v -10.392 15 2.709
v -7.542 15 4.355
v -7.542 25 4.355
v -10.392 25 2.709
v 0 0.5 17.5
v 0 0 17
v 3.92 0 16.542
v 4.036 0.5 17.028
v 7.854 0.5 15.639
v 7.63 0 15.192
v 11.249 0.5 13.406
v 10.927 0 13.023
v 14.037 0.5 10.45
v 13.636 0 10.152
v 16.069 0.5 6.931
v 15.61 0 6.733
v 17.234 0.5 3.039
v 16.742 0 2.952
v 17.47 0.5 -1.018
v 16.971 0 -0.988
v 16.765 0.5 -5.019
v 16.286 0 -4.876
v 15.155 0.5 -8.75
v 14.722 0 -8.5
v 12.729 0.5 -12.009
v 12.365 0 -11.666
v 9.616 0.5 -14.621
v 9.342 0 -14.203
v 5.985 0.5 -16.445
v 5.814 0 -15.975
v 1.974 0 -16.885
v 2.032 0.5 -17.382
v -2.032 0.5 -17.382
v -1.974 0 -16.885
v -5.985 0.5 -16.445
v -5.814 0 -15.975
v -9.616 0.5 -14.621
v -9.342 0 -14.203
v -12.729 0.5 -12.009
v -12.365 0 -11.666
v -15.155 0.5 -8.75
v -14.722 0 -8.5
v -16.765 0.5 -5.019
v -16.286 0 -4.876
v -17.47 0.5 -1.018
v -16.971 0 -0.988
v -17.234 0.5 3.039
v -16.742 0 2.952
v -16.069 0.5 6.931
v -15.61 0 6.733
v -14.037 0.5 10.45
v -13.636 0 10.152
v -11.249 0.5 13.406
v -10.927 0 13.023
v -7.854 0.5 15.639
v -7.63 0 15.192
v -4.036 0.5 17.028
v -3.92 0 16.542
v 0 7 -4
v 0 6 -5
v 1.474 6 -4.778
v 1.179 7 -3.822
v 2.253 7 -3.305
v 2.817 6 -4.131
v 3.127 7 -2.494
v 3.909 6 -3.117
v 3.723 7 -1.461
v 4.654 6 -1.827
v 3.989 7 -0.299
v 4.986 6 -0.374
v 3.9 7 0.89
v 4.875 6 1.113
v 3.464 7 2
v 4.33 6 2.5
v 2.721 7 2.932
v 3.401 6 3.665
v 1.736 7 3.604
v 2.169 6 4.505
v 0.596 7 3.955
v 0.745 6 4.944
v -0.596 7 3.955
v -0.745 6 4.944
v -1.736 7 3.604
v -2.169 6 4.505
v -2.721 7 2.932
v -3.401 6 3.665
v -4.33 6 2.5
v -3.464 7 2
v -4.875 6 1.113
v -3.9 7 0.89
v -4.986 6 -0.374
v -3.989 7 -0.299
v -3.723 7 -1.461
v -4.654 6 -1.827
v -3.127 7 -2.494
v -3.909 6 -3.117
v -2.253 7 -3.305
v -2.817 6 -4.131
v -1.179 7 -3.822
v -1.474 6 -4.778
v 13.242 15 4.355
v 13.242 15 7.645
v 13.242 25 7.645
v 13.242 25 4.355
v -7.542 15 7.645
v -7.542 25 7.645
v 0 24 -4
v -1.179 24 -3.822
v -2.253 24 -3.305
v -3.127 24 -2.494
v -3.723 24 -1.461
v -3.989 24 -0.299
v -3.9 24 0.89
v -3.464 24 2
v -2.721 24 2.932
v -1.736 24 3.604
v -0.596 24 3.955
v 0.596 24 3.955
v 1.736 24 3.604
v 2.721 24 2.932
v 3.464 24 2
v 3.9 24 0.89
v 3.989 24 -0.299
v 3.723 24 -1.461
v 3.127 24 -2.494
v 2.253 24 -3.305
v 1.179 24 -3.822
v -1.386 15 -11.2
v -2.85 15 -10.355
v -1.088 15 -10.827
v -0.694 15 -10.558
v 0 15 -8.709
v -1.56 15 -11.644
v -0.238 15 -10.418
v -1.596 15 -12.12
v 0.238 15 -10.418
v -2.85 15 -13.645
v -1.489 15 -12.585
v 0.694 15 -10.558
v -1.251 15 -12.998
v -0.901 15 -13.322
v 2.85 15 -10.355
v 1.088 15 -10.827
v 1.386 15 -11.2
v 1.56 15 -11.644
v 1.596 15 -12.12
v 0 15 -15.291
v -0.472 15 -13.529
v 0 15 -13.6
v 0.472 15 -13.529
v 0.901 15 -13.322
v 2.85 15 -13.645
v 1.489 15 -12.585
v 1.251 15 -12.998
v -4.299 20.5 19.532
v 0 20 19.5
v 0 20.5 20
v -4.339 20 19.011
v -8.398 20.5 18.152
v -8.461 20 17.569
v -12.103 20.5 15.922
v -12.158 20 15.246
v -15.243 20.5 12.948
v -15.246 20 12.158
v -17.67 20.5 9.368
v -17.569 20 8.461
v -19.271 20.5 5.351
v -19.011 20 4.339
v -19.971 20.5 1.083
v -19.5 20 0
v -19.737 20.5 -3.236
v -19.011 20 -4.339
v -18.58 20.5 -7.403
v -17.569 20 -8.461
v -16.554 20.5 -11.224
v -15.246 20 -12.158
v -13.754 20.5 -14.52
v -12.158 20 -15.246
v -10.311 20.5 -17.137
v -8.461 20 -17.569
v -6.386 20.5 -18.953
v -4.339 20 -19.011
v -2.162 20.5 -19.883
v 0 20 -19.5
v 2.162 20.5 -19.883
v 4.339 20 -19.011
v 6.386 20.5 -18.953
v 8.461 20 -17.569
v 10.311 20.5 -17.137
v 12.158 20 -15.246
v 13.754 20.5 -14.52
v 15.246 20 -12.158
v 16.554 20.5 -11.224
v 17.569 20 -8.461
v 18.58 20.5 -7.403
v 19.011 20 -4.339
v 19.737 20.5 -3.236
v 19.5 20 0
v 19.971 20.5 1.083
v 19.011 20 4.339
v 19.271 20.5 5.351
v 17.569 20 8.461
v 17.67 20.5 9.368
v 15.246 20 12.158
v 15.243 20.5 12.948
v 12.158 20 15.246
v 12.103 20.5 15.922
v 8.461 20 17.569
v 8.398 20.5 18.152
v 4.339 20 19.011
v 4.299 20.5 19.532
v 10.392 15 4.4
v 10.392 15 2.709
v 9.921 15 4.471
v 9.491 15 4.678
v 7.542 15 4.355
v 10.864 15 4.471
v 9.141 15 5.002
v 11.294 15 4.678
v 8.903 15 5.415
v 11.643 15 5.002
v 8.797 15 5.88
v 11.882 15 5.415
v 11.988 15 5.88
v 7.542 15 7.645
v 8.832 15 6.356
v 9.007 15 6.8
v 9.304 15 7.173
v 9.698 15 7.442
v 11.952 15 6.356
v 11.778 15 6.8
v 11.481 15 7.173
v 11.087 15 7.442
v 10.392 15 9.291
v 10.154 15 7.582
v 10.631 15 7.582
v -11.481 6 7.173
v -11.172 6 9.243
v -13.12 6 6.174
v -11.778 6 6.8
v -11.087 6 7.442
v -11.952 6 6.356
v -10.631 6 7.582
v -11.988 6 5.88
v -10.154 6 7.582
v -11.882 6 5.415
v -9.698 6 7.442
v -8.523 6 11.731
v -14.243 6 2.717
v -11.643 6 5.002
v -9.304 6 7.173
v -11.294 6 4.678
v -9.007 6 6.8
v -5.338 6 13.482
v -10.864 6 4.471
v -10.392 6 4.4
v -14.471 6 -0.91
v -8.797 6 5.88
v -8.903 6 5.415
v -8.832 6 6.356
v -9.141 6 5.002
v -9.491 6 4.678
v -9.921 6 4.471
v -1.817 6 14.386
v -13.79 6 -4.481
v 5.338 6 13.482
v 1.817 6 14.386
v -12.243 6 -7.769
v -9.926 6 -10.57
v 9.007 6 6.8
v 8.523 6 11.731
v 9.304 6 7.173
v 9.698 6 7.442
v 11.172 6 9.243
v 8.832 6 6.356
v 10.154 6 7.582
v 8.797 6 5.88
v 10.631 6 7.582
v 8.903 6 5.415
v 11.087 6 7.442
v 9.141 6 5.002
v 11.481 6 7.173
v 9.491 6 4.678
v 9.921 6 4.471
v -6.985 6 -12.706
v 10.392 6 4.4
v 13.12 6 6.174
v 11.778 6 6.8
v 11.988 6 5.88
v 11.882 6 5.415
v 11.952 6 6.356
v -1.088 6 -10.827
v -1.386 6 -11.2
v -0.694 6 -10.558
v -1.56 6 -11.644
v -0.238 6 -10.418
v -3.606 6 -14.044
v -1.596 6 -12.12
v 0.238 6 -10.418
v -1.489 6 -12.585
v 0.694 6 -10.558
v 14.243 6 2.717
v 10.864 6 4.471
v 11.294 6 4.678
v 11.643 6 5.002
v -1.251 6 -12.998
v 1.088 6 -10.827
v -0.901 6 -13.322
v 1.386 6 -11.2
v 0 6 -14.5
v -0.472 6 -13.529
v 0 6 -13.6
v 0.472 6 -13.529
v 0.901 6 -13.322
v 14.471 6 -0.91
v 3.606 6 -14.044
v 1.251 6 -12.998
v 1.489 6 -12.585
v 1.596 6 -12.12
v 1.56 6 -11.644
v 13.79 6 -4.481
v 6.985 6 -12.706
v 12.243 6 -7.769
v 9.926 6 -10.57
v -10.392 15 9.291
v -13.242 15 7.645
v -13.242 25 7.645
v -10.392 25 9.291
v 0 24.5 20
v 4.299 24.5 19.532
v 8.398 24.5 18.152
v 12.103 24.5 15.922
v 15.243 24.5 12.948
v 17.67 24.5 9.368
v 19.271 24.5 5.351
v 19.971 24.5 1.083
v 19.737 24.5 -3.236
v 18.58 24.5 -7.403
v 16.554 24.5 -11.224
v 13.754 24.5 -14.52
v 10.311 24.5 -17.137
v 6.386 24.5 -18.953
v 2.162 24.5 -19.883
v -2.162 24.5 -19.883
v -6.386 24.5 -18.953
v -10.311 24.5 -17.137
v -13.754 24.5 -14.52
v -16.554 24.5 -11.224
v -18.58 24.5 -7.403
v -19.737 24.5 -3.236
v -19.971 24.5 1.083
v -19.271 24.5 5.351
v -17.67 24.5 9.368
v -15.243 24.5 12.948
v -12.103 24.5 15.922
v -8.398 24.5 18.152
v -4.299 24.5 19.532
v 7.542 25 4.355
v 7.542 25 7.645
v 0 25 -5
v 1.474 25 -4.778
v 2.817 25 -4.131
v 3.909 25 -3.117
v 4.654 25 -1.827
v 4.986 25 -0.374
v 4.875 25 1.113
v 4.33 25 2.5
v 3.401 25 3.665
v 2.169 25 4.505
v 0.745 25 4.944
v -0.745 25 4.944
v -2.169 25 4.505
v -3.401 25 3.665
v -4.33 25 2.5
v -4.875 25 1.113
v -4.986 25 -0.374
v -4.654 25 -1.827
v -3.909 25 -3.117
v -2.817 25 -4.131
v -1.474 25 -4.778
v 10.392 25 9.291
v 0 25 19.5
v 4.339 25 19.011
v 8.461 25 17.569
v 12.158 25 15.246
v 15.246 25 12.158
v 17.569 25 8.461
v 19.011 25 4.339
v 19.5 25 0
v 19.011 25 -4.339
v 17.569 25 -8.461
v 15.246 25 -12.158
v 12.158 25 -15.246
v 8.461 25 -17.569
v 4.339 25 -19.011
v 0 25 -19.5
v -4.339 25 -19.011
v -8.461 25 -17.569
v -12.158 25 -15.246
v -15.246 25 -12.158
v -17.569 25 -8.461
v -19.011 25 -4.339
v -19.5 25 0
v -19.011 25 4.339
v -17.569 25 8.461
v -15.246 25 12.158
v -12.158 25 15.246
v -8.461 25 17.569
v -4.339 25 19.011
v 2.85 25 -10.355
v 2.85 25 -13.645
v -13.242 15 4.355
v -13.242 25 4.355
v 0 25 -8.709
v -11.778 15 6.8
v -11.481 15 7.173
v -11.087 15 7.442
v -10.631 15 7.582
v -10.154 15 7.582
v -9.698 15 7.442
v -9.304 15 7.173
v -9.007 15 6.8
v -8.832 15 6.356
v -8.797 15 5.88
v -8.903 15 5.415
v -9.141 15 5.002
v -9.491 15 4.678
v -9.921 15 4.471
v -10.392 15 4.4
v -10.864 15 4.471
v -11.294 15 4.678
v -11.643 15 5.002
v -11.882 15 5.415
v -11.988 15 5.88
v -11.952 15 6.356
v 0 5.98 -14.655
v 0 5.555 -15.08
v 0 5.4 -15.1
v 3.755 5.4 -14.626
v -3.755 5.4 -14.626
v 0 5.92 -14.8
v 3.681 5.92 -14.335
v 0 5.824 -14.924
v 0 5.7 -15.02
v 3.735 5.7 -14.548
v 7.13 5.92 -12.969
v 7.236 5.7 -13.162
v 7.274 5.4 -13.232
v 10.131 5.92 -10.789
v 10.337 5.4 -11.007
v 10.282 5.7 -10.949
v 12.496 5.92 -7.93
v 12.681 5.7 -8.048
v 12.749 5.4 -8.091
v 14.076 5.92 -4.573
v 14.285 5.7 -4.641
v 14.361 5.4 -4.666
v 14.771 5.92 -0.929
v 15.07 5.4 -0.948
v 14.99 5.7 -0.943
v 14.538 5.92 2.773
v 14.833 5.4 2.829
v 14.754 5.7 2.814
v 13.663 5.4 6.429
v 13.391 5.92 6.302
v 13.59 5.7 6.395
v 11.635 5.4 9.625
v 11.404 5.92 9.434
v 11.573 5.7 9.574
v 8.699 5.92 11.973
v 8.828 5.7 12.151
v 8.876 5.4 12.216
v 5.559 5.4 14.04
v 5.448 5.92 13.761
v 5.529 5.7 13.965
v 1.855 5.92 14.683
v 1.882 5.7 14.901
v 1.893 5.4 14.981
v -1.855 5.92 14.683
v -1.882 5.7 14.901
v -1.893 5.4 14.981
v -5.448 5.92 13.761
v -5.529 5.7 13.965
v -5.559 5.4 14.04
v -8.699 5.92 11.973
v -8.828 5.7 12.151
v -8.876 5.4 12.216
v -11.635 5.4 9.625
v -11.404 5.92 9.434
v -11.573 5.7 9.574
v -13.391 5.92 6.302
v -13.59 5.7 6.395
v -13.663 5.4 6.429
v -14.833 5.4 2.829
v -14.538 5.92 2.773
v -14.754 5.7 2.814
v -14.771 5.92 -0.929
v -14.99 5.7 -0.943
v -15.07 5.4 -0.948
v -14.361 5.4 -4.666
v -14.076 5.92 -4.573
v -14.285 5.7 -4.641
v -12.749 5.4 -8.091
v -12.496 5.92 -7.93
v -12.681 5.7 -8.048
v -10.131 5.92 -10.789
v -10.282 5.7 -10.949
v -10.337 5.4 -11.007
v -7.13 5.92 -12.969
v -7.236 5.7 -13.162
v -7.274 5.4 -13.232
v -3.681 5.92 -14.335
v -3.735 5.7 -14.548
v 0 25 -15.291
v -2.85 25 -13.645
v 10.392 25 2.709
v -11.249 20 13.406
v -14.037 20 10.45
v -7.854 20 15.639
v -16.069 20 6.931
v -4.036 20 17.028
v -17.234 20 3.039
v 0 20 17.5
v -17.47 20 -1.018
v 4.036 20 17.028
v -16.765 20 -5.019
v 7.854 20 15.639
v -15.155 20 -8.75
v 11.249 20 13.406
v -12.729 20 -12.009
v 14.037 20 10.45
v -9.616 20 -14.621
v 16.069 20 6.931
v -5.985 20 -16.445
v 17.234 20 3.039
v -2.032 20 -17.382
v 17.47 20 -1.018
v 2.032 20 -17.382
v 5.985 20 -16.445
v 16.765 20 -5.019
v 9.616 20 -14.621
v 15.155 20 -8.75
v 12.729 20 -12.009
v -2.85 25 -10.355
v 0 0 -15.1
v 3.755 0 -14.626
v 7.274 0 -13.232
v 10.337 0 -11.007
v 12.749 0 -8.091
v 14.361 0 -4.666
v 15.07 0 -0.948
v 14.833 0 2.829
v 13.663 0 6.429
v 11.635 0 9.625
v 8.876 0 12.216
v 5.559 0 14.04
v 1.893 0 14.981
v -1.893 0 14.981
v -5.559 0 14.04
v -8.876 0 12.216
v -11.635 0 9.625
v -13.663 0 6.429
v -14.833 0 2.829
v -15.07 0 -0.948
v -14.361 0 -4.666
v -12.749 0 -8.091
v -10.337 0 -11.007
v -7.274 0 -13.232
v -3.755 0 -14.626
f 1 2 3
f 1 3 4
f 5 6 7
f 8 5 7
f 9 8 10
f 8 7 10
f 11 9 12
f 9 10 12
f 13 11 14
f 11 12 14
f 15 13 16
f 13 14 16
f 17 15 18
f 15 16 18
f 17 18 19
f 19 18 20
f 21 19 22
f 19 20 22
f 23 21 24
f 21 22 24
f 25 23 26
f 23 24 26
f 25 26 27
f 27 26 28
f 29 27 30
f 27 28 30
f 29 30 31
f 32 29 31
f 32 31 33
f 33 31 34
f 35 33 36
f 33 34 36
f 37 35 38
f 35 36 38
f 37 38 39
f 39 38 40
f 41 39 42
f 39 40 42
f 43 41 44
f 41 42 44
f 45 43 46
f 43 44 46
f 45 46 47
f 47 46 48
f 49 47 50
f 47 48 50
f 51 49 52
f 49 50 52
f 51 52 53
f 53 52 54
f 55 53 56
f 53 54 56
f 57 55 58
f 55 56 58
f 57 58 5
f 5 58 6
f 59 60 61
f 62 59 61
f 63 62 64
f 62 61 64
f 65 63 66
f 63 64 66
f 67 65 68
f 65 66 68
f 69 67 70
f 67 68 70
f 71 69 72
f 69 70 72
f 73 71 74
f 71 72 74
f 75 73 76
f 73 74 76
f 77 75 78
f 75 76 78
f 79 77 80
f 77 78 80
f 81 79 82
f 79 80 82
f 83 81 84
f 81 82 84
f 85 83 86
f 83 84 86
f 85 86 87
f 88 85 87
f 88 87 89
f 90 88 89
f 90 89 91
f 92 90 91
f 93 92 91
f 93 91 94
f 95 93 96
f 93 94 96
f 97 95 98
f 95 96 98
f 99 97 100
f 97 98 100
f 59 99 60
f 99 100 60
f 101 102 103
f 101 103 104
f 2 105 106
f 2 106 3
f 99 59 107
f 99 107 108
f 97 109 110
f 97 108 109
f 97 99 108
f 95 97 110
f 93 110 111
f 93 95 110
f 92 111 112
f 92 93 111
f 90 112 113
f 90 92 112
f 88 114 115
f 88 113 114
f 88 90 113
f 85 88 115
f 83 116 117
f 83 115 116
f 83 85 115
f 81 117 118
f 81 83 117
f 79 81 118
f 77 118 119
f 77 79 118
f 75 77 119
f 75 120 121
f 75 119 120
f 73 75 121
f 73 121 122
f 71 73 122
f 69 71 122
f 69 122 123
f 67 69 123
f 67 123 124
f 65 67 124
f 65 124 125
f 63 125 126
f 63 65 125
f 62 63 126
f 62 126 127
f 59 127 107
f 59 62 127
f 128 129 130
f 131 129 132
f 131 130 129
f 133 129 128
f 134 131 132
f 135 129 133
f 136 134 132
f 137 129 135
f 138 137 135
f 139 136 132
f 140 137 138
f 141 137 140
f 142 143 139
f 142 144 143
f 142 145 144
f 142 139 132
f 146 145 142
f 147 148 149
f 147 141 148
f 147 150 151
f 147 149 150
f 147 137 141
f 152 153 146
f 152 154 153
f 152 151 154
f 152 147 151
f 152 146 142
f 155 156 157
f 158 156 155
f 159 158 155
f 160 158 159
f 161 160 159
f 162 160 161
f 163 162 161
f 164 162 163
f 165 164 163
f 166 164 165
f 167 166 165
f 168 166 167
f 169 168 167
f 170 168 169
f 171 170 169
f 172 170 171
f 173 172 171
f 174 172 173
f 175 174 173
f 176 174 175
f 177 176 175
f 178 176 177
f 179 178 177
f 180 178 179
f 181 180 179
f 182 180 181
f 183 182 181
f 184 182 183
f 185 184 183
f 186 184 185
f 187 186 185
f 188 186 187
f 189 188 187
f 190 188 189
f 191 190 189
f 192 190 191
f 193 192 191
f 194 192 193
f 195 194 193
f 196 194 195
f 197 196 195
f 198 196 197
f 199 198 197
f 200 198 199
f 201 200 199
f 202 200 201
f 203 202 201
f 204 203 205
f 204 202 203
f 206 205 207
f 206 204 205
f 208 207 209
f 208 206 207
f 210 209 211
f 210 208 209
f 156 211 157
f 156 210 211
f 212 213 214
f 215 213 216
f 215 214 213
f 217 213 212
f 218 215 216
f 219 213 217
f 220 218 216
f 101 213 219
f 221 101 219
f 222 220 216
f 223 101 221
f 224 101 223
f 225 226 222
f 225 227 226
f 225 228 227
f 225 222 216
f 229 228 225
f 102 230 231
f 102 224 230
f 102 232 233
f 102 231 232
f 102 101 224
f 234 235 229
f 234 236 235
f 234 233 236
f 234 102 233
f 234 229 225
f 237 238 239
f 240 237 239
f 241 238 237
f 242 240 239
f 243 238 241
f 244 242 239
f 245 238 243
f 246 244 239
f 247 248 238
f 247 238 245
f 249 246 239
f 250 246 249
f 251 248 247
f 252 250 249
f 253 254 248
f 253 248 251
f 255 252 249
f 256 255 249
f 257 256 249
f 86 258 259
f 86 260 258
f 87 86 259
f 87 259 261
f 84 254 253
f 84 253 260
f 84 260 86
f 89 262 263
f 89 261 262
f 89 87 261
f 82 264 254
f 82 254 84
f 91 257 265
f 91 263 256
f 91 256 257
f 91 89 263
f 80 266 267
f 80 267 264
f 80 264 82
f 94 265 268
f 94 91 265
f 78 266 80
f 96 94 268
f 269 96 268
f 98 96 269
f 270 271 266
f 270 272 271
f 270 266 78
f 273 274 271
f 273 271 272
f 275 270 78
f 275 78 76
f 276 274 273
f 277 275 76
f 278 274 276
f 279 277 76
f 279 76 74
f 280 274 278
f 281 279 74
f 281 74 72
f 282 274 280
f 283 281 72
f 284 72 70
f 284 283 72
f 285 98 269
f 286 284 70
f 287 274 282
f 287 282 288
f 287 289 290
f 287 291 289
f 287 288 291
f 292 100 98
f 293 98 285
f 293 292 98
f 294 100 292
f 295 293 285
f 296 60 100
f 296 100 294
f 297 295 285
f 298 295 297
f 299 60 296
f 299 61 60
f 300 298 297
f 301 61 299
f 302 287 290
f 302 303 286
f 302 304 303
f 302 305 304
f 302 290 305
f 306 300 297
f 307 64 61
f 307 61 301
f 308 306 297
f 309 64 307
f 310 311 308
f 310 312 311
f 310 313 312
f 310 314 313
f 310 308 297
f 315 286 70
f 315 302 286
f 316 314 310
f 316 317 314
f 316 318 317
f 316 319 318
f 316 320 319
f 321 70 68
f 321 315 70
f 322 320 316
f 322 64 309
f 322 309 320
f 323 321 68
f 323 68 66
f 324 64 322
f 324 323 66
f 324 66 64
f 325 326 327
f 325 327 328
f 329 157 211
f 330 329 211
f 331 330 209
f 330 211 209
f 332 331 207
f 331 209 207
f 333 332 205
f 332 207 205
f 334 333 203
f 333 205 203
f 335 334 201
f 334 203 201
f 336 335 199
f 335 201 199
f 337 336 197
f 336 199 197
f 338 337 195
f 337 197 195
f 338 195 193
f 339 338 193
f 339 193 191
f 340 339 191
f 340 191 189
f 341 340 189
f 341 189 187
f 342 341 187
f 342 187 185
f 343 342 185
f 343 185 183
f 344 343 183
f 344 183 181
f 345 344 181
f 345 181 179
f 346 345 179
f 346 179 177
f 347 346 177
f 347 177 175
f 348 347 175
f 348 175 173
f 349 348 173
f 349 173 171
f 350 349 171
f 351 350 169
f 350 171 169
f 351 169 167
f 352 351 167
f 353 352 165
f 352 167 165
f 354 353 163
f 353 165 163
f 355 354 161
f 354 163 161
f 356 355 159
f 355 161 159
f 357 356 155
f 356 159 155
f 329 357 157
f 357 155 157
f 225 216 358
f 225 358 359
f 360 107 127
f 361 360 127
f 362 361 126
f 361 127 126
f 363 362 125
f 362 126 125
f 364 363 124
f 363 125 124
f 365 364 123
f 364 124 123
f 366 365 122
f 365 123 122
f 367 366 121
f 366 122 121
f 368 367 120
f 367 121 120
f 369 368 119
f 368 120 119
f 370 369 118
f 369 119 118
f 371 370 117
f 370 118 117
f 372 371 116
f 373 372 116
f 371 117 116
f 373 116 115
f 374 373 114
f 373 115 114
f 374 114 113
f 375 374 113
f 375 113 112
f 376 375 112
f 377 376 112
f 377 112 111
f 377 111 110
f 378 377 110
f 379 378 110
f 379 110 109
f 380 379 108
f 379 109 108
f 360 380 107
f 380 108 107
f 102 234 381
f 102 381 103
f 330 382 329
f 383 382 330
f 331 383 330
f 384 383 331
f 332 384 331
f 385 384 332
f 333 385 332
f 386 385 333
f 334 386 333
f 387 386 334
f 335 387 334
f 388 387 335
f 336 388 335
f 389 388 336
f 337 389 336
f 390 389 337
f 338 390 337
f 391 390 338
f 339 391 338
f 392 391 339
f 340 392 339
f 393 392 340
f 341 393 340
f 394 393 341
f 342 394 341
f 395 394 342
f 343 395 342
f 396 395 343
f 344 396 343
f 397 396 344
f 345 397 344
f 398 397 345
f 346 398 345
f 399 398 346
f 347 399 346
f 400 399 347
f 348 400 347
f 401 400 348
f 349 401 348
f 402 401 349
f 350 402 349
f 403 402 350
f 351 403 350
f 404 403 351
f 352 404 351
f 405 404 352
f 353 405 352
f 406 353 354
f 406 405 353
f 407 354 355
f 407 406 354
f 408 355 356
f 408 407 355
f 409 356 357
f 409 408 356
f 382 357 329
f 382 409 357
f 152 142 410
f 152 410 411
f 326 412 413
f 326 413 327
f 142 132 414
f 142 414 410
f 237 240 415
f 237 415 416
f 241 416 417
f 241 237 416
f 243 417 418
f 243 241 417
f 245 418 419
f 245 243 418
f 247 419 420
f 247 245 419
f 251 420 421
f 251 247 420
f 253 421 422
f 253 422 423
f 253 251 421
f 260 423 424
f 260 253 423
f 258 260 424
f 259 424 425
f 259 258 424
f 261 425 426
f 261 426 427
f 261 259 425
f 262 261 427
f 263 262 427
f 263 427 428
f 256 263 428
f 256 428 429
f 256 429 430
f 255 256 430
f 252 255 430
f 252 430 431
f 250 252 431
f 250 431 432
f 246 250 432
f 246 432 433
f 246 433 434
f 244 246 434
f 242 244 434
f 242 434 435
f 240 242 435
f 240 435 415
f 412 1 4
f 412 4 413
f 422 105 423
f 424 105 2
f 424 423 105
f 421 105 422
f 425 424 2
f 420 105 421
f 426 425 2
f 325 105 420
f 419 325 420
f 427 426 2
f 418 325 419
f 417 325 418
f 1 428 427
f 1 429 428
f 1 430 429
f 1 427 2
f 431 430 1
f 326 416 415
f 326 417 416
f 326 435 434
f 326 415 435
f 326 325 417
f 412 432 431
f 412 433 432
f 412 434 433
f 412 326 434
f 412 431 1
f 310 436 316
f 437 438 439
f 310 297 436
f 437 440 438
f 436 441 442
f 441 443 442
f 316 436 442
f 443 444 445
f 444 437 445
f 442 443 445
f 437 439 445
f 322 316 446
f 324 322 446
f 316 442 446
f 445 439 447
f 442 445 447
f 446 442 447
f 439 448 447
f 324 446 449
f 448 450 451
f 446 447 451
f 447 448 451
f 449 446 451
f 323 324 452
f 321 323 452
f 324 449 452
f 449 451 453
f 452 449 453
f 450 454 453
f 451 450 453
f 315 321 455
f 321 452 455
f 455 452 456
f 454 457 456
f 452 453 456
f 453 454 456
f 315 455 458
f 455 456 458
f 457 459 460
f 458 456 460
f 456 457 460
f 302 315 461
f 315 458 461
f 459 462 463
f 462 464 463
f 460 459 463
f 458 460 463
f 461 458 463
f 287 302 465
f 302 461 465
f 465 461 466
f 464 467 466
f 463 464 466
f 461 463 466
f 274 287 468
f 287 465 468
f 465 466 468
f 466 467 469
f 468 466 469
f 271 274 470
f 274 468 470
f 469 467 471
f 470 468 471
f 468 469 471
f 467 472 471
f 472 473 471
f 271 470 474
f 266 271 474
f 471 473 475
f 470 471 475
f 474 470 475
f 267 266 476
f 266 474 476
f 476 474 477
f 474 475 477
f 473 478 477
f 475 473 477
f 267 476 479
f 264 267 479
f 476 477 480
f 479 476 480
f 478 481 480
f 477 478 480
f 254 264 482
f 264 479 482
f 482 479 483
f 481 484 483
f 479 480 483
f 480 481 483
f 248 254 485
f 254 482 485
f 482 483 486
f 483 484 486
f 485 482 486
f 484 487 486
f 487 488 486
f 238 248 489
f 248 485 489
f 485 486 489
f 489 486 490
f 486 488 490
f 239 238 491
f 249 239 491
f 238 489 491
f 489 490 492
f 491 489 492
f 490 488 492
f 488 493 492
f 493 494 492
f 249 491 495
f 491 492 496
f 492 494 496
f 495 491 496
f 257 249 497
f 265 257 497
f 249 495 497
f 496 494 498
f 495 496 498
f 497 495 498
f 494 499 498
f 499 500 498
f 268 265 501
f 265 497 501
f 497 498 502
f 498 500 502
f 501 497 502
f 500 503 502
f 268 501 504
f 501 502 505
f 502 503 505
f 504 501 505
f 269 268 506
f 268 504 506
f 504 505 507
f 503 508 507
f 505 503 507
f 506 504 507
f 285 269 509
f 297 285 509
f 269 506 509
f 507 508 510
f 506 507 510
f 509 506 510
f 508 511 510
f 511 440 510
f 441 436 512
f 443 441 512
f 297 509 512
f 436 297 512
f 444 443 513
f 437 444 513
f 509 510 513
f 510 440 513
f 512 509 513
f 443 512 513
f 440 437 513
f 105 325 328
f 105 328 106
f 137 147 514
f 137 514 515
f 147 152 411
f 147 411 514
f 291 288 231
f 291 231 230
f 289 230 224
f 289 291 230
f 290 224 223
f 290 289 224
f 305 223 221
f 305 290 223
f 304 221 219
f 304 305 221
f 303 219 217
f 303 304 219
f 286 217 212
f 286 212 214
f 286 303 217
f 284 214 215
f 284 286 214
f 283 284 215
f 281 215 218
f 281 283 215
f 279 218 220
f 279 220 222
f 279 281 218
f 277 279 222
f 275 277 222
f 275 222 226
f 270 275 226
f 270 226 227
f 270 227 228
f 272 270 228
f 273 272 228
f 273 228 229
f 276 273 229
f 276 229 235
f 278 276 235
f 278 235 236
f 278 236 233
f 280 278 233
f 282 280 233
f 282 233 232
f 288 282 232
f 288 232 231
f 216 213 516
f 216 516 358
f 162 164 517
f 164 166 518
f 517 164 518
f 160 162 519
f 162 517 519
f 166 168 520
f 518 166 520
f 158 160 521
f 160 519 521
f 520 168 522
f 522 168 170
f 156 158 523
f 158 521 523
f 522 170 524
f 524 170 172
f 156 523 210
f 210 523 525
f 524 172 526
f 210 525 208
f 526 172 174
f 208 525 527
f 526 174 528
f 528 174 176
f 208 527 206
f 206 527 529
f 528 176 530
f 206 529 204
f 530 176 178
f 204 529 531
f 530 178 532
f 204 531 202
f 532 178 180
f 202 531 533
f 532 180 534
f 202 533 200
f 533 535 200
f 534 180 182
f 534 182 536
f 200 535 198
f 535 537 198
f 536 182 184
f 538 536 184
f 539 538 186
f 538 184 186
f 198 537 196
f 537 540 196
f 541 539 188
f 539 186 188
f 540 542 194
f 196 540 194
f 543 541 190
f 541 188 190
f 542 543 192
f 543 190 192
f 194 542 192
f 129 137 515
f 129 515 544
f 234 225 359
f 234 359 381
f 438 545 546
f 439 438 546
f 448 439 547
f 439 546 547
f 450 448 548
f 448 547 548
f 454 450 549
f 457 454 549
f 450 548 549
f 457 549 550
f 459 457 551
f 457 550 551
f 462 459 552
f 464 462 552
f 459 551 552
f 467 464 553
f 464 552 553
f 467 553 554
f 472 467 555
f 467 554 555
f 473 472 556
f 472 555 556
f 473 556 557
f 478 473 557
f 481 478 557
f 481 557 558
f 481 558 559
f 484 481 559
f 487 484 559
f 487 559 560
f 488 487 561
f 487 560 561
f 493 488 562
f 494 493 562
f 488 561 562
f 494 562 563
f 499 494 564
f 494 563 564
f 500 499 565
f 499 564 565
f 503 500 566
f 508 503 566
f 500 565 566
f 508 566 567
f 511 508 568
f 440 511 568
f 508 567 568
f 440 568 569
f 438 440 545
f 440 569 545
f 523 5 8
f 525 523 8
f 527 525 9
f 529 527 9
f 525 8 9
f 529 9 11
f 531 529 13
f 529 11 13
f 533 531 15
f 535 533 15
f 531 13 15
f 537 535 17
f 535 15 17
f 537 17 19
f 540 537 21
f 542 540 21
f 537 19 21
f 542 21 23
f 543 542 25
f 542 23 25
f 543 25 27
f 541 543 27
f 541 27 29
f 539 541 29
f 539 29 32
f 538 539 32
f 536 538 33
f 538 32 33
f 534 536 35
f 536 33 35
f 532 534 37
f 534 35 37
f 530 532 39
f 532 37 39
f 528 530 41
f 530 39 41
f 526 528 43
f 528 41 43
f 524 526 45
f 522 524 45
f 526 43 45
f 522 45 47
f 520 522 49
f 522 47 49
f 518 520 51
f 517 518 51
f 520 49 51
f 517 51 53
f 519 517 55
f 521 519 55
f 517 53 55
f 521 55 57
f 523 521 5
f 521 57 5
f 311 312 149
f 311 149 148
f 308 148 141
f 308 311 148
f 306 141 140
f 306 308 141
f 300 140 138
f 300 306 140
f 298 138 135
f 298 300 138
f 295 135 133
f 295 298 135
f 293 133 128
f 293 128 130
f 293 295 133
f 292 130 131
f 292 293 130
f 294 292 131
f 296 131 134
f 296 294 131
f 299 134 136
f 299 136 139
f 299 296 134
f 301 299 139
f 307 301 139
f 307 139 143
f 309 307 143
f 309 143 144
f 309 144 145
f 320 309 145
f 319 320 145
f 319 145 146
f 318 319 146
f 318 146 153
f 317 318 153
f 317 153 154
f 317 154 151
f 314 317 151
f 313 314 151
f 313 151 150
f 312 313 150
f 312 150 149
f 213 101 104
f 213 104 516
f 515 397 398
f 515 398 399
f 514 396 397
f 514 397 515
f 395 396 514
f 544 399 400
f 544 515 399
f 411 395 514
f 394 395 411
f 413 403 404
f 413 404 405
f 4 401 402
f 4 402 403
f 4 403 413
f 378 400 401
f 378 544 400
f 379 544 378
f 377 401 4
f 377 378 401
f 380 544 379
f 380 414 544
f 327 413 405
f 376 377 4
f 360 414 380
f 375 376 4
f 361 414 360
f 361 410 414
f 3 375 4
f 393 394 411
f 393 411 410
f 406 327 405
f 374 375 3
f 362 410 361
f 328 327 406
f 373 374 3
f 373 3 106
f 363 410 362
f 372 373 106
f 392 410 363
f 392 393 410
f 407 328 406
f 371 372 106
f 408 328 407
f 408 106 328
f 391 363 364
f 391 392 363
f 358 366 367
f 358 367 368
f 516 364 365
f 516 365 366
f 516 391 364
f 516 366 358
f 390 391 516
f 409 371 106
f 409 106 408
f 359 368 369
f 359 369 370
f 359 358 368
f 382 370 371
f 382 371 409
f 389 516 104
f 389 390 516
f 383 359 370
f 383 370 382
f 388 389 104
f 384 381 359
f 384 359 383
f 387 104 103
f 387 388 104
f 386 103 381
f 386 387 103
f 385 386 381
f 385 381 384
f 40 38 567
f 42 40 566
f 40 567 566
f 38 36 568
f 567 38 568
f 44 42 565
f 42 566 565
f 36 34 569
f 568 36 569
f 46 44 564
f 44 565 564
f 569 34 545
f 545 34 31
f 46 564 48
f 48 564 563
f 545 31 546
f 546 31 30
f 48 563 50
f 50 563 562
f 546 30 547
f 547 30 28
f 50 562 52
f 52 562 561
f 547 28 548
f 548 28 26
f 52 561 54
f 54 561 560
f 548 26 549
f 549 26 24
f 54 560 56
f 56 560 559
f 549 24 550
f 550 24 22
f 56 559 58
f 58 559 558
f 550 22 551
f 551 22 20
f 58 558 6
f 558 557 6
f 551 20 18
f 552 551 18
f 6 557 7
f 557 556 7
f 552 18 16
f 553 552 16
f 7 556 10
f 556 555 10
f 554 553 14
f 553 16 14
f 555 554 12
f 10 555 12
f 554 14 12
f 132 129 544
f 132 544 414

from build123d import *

# Parameters (mm, degrees)
SKETCH_1_R               = 20
EXTRUDE_1_DEPTH          = 25
SKETCH_2_OUTSIDE_W       = 54.37
SKETCH_2_OUTSIDE_H       = 54.37
SKETCH_2_OUTSIDE_R       = 17.5
CUT_EXTRUDE_1_DEPTH      = 20
SKETCH_3_R               = 15.1
CUT_EXTRUDE_2_DEPTH      = 6
SKETCH_4_R               = 4
CUT_EXTRUDE_3_DEPTH      = 38.749172176
SKETCH_4_3_R             = 1.6
CUT_EXTRUDE_4_DEPTH      = 38.749172176
CUT_EXTRUDE_START        = 15
SKETCH_4_4_R             = 1.6
CUT_EXTRUDE_5_DEPTH      = 23.749172176
PATTERN_CIRCULAR_1_COUNT = 3
CHAMFER_1_SIZE           = 0.5
CHAMFER_2_SIZE           = 1
FILLET_1_R               = 0.6


with BuildPart() as part:
    # Эскиз1 → Бобышка-Вытянуть1 (new body)
    with BuildSketch(Plane(origin=(0, 0, 0), x_dir=(1, 0, 0), z_dir=(0, 1, 0))):
        Circle(SKETCH_1_R)
    extrude(amount=EXTRUDE_1_DEPTH)

    # Эскиз2 outside → Вырез-Вытянуть1 (cut)
    with BuildSketch(Plane(origin=(0, 0, 0), x_dir=(1, 0, 0), z_dir=(0, 1, 0))):
        Rectangle(SKETCH_2_OUTSIDE_W, SKETCH_2_OUTSIDE_H)
        Circle(SKETCH_2_OUTSIDE_R, mode=Mode.SUBTRACT)
    extrude(amount=CUT_EXTRUDE_1_DEPTH, mode=Mode.SUBTRACT)

    # Эскиз3 → Вырез-Вытянуть2 (cut)
    with BuildSketch(Plane.XZ):
        Circle(SKETCH_3_R)
    extrude(amount=-CUT_EXTRUDE_2_DEPTH, mode=Mode.SUBTRACT)

    # Эскиз4 → Вырез-Вытянуть3 (cut, through all)
    with BuildSketch(Plane(origin=(0, 0, 0), x_dir=(1, 0, 0), z_dir=(0, 1, 0))):
        Circle(SKETCH_4_R)
    extrude(amount=CUT_EXTRUDE_3_DEPTH, mode=Mode.SUBTRACT)

    # Эскиз4<3> → Вырез-Вытянуть4 (cut, through all)
    with BuildSketch(Plane(origin=(0, 0, 0), x_dir=(1, 0, 0), z_dir=(0, 1, 0))):
        with Locations((0, 12)):
            Circle(SKETCH_4_3_R)
    cut_extrude_4 = extrude(amount=CUT_EXTRUDE_4_DEPTH, mode=Mode.SUBTRACT)

    # Эскиз4<4> → Вырез-Вытянуть5 (cut, through all)
    with BuildSketch(Plane(origin=(0, 0, 0), x_dir=(1, 0, 0), z_dir=(0, 1, 0)).offset(CUT_EXTRUDE_START)):
        Polygon((2.85, 13.645448267), (0, 15.290896534), (-2.85, 13.645448267), (-2.85, 10.354551733), (0, 8.709103466), (2.85, 10.354551733), align=None)
        with Locations((0, 12)):
            Circle(SKETCH_4_4_R, mode=Mode.SUBTRACT)
    cut_extrude_5 = extrude(amount=CUT_EXTRUDE_5_DEPTH, mode=Mode.SUBTRACT)

    # Круговой массив1: Вырез-Вытянуть4, Вырез-Вытянуть5 ×3 about axis
    pattern_circular_1_axis = Axis((0, 20, 0), (0, -1, 0))
    add([cut_extrude_4.rotate(pattern_circular_1_axis, i * 360 / PATTERN_CIRCULAR_1_COUNT) for i in range(1, PATTERN_CIRCULAR_1_COUNT)], mode=Mode.SUBTRACT)
    add([cut_extrude_5.rotate(pattern_circular_1_axis, i * 360 / PATTERN_CIRCULAR_1_COUNT) for i in range(1, PATTERN_CIRCULAR_1_COUNT)], mode=Mode.SUBTRACT)

    # Фаска1
    chamfer_1_edges = [part.edges().sort_by_distance(p)[0] for p in [
        (-20, 25, 0),
        (-20, 20, 0),
        (-17.5, 0, 0),
    ]]
    chamfer(chamfer_1_edges, length=CHAMFER_1_SIZE)

    # Фаска2
    chamfer_2_edges = [part.edges().sort_by_distance(p)[0] for p in [
        (-4, 25, 0),
        (-4, 6, 0),
    ]]
    chamfer(chamfer_2_edges, length=CHAMFER_2_SIZE)

    # Скругление1
    fillet_1_edges = [part.edges().sort_by_distance(p)[0] for p in [
        (-15.1, 6, 0),
    ]]
    fillet(fillet_1_edges, radius=FILLET_1_R)


solid = part.part
